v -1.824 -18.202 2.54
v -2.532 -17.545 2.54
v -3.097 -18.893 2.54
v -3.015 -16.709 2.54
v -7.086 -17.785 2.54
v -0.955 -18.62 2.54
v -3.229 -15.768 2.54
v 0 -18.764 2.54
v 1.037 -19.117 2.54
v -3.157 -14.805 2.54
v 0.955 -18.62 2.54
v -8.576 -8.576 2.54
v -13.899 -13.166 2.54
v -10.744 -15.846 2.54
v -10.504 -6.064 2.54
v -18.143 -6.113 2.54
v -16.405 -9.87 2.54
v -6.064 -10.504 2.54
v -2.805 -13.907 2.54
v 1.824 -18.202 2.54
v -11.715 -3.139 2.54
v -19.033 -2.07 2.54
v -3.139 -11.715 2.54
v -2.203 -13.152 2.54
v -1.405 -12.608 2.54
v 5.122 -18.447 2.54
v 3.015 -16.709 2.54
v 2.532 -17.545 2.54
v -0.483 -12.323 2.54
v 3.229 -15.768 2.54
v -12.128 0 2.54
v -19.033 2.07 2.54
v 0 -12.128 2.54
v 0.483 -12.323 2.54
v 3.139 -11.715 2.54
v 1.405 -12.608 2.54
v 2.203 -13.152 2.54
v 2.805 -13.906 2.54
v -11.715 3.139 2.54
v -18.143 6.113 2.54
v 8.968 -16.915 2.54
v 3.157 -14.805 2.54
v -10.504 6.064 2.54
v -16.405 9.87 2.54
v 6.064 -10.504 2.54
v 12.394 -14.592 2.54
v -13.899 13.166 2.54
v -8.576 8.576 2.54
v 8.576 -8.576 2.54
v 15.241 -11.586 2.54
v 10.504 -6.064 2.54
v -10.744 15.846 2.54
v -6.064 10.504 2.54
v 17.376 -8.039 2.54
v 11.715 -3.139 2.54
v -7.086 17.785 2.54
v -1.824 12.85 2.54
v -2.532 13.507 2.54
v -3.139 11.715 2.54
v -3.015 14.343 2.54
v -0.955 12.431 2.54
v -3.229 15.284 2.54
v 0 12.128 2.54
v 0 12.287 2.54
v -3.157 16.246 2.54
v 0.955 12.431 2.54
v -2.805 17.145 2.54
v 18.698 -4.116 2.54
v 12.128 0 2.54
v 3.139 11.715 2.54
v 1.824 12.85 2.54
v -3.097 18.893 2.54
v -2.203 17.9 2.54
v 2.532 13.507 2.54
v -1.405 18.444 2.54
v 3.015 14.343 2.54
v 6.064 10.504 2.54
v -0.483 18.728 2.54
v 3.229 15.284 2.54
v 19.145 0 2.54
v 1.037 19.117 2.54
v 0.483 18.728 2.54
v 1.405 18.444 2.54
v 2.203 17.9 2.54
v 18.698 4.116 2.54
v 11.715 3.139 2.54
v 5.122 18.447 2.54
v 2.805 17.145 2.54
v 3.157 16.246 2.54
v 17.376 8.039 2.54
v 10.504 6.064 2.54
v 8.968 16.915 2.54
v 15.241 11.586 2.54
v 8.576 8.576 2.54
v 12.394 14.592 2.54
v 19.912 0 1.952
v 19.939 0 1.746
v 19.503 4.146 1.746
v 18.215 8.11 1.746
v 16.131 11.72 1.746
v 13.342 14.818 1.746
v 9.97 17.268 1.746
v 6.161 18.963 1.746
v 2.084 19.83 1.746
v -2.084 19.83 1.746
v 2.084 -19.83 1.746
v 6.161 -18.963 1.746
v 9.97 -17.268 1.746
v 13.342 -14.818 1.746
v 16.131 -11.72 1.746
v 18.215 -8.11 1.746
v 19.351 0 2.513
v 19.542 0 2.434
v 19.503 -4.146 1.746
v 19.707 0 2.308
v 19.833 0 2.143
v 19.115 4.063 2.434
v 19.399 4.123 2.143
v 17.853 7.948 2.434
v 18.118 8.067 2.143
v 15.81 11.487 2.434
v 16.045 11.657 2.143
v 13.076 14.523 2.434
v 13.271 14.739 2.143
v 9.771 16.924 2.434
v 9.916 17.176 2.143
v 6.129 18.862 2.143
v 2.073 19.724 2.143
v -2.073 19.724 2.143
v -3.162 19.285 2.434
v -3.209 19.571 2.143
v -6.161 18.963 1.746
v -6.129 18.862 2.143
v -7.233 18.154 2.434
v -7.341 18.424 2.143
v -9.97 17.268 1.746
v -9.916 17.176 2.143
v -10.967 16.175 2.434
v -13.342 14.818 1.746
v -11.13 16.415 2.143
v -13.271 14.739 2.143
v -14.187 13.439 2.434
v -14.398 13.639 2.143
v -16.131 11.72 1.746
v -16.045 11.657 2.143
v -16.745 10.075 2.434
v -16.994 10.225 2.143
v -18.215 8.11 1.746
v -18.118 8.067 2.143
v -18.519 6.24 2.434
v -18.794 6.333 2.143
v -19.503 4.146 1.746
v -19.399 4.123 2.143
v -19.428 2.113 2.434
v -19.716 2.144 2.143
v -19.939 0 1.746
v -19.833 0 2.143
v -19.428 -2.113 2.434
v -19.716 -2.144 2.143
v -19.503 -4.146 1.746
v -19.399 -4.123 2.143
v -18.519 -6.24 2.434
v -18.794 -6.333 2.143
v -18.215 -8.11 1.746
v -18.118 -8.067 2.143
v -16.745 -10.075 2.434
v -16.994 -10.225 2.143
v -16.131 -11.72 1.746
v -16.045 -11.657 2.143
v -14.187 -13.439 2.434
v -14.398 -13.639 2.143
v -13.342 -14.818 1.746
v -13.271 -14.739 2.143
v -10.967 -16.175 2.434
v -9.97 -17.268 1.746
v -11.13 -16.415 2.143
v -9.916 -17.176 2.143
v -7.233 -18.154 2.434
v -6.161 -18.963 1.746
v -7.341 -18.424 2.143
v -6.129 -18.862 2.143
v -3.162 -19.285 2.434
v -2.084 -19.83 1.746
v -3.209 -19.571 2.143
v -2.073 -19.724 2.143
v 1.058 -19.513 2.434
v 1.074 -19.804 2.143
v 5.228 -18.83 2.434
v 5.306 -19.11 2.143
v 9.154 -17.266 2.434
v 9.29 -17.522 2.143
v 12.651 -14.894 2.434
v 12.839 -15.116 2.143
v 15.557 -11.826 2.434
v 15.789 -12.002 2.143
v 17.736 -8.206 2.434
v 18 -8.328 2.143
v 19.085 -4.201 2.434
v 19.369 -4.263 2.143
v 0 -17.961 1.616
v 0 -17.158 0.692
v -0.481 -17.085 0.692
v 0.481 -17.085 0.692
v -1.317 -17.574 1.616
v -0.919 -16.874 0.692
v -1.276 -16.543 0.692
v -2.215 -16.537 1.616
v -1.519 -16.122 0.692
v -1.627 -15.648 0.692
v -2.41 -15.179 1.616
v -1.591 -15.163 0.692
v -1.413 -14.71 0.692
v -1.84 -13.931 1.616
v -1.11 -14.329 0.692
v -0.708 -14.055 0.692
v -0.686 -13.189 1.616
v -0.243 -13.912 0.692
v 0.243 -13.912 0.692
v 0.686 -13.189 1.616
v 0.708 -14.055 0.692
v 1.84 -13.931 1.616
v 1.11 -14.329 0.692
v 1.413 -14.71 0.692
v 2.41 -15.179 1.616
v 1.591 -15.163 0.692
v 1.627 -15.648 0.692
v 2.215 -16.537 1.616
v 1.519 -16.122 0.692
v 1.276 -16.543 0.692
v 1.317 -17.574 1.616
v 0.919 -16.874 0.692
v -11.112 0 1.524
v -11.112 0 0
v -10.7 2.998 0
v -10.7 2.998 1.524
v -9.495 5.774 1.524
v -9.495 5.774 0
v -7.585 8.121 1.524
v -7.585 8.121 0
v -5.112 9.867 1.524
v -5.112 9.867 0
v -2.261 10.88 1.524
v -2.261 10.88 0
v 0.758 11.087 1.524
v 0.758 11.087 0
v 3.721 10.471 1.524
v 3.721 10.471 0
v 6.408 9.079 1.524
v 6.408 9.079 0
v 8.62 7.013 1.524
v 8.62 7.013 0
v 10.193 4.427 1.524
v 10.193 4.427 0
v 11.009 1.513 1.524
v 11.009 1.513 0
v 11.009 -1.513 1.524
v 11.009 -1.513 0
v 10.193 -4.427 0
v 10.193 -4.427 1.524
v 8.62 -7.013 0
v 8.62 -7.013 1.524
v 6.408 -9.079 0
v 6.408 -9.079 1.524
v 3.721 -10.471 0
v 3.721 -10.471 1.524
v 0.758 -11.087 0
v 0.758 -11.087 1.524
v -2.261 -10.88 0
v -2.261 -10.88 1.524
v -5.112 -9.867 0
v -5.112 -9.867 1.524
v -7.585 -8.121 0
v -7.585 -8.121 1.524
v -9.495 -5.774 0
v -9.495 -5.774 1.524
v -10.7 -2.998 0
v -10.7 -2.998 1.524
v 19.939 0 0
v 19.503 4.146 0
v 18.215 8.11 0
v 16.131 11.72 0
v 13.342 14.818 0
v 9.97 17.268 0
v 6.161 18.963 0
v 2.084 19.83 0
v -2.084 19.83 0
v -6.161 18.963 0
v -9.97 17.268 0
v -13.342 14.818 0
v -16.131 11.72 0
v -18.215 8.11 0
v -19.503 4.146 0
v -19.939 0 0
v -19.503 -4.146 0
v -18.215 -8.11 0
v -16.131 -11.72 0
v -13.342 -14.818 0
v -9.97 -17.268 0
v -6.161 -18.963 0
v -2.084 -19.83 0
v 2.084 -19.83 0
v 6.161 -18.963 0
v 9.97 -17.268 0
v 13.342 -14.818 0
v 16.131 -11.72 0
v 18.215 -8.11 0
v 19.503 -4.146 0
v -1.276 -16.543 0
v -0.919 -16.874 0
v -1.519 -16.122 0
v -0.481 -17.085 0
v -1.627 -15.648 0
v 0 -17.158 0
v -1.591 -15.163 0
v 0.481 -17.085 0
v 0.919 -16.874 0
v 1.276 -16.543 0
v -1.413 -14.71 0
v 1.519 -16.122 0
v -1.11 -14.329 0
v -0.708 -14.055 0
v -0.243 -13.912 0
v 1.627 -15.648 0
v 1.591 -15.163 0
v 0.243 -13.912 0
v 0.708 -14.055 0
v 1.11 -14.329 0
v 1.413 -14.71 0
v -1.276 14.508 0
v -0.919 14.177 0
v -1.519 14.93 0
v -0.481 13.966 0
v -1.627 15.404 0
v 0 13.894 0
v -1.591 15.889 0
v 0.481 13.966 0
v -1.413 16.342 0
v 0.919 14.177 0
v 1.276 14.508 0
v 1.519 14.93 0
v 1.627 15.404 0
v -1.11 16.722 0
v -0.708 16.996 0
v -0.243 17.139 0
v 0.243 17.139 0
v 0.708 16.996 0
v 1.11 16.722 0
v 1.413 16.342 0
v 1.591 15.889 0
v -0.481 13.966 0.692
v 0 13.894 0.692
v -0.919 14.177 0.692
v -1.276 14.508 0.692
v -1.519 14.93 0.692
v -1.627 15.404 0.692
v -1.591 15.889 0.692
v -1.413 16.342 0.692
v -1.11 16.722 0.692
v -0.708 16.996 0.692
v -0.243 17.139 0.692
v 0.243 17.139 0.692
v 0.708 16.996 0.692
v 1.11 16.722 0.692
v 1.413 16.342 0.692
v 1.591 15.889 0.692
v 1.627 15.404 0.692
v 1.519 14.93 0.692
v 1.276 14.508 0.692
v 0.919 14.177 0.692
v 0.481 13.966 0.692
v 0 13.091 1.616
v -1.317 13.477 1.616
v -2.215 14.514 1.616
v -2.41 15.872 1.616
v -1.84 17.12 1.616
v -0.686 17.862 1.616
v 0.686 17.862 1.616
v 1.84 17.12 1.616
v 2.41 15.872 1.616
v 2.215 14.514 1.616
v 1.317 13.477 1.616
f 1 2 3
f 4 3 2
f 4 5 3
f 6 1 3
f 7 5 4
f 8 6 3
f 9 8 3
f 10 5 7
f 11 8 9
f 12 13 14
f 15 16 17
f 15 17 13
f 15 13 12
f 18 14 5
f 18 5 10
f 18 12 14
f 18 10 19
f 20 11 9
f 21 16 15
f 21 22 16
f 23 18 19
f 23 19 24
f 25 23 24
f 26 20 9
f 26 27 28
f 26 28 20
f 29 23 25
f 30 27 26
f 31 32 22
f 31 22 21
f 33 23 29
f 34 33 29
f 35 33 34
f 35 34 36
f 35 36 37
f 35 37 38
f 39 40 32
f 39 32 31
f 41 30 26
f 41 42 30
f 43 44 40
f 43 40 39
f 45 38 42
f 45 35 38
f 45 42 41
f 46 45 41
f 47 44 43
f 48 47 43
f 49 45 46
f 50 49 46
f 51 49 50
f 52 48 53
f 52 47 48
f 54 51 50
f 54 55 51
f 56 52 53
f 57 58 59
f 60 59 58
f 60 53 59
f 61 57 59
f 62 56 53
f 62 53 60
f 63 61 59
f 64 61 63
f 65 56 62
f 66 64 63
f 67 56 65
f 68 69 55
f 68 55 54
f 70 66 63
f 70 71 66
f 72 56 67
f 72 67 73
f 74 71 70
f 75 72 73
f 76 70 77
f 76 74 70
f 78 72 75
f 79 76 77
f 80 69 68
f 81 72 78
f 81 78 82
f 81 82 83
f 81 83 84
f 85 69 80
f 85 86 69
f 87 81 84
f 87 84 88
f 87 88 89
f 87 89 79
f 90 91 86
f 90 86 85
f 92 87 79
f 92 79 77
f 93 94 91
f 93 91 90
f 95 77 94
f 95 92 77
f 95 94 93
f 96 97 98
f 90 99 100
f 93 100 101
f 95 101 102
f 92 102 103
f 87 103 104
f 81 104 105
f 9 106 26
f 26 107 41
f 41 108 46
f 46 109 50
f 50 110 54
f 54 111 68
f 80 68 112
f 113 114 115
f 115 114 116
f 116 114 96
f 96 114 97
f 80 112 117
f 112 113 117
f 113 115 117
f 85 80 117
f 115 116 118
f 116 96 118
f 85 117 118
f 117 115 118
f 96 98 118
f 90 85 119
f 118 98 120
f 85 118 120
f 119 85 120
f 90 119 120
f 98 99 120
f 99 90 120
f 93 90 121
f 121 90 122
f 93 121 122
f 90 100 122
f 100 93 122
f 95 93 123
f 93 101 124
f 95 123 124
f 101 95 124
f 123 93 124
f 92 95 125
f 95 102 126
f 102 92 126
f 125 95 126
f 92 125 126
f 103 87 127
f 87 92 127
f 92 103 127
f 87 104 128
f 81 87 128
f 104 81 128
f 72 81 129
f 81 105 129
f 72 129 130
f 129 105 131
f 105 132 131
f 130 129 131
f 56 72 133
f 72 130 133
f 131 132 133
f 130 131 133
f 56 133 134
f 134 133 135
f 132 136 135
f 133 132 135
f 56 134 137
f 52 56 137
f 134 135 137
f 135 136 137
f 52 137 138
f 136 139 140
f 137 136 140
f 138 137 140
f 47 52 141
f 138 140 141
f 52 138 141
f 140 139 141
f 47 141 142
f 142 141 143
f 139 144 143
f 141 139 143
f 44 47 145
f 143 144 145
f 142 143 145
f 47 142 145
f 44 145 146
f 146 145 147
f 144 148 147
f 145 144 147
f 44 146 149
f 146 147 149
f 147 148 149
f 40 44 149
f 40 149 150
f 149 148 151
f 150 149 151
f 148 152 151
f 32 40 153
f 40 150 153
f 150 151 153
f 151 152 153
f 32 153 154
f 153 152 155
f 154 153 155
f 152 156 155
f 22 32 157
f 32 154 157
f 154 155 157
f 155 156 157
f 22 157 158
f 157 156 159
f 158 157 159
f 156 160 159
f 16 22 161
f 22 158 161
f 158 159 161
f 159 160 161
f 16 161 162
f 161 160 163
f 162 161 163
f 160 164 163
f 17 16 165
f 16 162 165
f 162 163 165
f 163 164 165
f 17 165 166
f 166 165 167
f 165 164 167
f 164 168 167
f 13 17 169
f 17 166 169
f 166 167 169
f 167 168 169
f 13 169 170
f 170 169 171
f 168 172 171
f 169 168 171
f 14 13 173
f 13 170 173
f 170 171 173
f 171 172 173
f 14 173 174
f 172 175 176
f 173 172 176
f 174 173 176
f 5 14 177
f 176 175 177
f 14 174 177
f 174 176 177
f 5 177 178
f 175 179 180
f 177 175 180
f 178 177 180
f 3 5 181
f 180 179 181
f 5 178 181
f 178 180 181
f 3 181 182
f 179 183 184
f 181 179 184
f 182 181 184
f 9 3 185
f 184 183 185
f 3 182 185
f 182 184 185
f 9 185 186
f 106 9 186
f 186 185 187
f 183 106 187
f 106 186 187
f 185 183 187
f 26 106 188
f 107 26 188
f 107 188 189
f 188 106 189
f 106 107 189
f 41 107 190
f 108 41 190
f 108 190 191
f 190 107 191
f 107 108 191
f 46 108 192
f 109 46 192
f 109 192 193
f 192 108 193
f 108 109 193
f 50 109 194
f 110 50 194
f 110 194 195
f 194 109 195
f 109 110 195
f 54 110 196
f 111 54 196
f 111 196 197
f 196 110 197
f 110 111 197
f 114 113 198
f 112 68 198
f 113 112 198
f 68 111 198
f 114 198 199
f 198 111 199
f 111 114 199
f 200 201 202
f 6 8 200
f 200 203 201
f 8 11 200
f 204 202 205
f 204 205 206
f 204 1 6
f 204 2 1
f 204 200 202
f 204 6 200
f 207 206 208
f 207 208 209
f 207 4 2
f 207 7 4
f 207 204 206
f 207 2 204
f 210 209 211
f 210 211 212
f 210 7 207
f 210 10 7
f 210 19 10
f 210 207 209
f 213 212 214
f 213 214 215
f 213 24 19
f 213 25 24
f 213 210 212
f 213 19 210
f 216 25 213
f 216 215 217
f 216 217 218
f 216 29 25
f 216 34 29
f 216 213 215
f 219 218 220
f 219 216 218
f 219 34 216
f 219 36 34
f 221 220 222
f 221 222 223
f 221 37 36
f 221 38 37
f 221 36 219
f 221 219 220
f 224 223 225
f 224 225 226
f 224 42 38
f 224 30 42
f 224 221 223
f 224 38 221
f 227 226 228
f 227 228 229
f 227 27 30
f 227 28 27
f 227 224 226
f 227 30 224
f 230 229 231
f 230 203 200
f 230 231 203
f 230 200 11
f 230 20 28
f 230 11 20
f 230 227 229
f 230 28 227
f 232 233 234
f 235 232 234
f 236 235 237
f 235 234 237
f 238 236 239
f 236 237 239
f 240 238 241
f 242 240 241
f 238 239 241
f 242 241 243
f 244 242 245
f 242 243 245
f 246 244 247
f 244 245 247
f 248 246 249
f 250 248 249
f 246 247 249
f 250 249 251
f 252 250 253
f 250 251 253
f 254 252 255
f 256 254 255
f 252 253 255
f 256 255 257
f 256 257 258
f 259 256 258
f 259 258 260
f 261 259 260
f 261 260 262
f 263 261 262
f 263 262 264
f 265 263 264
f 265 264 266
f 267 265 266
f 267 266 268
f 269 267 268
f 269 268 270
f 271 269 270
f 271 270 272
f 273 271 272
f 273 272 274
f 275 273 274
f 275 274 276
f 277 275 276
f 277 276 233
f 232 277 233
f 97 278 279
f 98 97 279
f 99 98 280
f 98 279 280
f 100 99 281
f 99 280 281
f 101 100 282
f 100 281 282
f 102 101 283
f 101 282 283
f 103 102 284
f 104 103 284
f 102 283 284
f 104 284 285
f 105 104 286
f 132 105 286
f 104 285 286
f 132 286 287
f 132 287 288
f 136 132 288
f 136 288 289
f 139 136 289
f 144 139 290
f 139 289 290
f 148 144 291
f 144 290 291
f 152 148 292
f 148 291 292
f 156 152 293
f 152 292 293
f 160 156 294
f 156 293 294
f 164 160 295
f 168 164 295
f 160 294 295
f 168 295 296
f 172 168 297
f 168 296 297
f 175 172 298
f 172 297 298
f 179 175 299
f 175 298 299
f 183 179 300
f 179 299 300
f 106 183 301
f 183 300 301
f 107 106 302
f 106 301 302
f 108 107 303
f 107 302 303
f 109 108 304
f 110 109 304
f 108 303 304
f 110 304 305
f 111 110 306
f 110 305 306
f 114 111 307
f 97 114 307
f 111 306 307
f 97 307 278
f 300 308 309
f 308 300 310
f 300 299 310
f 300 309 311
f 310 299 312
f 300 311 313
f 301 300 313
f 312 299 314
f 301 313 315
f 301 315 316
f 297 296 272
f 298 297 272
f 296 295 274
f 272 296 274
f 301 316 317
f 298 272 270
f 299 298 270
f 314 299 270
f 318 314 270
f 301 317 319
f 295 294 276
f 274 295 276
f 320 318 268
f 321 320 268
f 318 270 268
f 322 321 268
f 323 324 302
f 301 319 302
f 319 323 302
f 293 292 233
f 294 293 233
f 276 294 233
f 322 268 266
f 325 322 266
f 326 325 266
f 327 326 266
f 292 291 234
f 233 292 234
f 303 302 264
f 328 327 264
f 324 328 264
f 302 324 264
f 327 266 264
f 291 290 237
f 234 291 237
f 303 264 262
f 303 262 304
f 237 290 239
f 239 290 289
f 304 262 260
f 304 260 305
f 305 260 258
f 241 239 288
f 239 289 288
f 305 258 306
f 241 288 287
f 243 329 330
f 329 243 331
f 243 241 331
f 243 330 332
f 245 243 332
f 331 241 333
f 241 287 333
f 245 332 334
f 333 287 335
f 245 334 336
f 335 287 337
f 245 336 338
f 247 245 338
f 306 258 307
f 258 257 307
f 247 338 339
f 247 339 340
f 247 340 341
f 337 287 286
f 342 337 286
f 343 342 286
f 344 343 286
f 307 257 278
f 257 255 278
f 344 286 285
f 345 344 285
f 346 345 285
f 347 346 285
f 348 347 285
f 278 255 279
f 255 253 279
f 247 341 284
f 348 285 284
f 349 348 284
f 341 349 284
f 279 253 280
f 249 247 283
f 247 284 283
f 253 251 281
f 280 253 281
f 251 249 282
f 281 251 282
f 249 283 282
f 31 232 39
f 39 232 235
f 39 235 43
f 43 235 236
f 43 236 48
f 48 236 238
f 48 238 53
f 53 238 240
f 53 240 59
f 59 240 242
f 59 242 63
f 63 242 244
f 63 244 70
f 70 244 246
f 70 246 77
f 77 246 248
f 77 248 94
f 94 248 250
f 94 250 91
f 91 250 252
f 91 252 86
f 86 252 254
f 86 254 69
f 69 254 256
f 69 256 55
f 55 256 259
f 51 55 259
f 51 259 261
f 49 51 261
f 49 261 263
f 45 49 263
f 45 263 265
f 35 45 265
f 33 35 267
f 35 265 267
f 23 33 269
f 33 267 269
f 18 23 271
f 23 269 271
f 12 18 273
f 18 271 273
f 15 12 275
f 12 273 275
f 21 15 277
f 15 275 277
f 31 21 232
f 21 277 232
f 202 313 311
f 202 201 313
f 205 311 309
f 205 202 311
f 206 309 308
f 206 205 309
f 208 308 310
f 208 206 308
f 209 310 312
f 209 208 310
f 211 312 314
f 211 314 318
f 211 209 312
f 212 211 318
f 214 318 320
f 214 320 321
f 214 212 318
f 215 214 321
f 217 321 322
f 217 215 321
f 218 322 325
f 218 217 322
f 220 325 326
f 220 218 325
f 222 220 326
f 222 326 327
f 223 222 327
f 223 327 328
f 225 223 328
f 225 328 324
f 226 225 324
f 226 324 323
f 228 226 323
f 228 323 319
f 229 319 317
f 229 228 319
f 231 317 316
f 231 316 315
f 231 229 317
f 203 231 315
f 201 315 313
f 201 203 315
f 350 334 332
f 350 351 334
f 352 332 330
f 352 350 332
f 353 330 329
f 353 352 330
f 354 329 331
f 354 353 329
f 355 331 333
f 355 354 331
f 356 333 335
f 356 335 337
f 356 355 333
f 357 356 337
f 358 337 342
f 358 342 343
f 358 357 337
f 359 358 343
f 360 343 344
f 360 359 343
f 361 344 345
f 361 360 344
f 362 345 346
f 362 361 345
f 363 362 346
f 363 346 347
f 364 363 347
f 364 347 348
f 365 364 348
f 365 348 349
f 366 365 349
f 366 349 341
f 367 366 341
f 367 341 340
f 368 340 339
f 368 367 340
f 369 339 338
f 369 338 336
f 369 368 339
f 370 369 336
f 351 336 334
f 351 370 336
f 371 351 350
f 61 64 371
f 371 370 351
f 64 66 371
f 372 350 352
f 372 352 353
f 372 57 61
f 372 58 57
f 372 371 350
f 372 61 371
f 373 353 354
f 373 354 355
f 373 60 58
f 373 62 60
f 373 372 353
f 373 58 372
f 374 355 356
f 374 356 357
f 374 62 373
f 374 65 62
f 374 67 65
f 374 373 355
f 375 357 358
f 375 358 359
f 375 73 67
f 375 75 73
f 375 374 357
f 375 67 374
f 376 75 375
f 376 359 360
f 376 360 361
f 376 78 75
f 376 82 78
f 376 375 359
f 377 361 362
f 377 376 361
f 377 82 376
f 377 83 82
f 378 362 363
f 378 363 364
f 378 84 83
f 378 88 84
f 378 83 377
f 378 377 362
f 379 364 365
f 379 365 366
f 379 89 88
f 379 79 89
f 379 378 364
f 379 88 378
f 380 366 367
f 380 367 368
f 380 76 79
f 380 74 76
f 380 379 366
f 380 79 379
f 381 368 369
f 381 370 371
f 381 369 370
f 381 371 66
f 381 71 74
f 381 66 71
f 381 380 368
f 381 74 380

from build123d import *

# Parameters (mm, degrees)
SKETCH1_R                                     = 19.939
BOSS_EXTRUDE1_DEPTH                           = 2.54
F_7_8_0_875_DIAMETER_HOLE1_D                  = 22.225
CSK_FOR_4_FLAT_HEAD_SOCKET_CAP_SCREW1_A_COUNT = 2
CSK_FOR_4_FLAT_HEAD_SOCKET_CAP_SCREW1_A_PITCH = 31.0515
CHAMFER1_SIZE                                 = 1.016
FILLET1_R                                     = 0.79375


with BuildPart() as part:
    # Sketch1 → Boss-Extrude1 (new body)
    with BuildSketch(Plane.XY):
        Circle(SKETCH1_R)
    extrude(amount=BOSS_EXTRUDE1_DEPTH)

    # 7/8 (0.875) Diameter Hole1 (through all)
    with Locations(Plane.XY.offset(2.54)):
        with Locations((0, 0)):
            Hole(F_7_8_0_875_DIAMETER_HOLE1_D / 2)

    # Sketch24 → CSK for #4 Flat Head Socket Cap Screw1 (revolve, cut)
    with BuildSketch(Plane(origin=(0, 15.52575, 2.54), x_dir=(0, -1, 0), z_dir=(1, 0, 0))):
        Polygon((0, 0), (0, 2.54), (1.63195, 2.54), (1.63195, 1.848124365), (3.2385, 0), align=None)
    csk_for_4_flat_head_socket_cap_screw1 = revolve(axis=Axis((0, 15.52575, 8.89), (0, 0, -1)), mode=Mode.SUBTRACT)

    # CSK for #4 Flat Head Socket Cap Screw1 a: CSK for #4 Flat Head Socket Cap Screw1 ×2
    with Locations(*[(0, -i * CSK_FOR_4_FLAT_HEAD_SOCKET_CAP_SCREW1_A_PITCH, 0) for i in range(1, CSK_FOR_4_FLAT_HEAD_SOCKET_CAP_SCREW1_A_COUNT)]):
        add(csk_for_4_flat_head_socket_cap_screw1, mode=Mode.SUBTRACT)

    # Chamfer1
    chamfer1_edges = [part.edges().sort_by_distance(p)[0] for p in [
        (11.1125, 0, 2.54),
    ]]
    chamfer(chamfer1_edges, length=CHAMFER1_SIZE)

    # Fillet1
    fillet1_edges = [part.edges().sort_by_distance(p)[0] for p in [
        (-19.939, 0, 2.54),
    ]]
    fillet(fillet1_edges, radius=FILLET1_R)


solid = part.part
